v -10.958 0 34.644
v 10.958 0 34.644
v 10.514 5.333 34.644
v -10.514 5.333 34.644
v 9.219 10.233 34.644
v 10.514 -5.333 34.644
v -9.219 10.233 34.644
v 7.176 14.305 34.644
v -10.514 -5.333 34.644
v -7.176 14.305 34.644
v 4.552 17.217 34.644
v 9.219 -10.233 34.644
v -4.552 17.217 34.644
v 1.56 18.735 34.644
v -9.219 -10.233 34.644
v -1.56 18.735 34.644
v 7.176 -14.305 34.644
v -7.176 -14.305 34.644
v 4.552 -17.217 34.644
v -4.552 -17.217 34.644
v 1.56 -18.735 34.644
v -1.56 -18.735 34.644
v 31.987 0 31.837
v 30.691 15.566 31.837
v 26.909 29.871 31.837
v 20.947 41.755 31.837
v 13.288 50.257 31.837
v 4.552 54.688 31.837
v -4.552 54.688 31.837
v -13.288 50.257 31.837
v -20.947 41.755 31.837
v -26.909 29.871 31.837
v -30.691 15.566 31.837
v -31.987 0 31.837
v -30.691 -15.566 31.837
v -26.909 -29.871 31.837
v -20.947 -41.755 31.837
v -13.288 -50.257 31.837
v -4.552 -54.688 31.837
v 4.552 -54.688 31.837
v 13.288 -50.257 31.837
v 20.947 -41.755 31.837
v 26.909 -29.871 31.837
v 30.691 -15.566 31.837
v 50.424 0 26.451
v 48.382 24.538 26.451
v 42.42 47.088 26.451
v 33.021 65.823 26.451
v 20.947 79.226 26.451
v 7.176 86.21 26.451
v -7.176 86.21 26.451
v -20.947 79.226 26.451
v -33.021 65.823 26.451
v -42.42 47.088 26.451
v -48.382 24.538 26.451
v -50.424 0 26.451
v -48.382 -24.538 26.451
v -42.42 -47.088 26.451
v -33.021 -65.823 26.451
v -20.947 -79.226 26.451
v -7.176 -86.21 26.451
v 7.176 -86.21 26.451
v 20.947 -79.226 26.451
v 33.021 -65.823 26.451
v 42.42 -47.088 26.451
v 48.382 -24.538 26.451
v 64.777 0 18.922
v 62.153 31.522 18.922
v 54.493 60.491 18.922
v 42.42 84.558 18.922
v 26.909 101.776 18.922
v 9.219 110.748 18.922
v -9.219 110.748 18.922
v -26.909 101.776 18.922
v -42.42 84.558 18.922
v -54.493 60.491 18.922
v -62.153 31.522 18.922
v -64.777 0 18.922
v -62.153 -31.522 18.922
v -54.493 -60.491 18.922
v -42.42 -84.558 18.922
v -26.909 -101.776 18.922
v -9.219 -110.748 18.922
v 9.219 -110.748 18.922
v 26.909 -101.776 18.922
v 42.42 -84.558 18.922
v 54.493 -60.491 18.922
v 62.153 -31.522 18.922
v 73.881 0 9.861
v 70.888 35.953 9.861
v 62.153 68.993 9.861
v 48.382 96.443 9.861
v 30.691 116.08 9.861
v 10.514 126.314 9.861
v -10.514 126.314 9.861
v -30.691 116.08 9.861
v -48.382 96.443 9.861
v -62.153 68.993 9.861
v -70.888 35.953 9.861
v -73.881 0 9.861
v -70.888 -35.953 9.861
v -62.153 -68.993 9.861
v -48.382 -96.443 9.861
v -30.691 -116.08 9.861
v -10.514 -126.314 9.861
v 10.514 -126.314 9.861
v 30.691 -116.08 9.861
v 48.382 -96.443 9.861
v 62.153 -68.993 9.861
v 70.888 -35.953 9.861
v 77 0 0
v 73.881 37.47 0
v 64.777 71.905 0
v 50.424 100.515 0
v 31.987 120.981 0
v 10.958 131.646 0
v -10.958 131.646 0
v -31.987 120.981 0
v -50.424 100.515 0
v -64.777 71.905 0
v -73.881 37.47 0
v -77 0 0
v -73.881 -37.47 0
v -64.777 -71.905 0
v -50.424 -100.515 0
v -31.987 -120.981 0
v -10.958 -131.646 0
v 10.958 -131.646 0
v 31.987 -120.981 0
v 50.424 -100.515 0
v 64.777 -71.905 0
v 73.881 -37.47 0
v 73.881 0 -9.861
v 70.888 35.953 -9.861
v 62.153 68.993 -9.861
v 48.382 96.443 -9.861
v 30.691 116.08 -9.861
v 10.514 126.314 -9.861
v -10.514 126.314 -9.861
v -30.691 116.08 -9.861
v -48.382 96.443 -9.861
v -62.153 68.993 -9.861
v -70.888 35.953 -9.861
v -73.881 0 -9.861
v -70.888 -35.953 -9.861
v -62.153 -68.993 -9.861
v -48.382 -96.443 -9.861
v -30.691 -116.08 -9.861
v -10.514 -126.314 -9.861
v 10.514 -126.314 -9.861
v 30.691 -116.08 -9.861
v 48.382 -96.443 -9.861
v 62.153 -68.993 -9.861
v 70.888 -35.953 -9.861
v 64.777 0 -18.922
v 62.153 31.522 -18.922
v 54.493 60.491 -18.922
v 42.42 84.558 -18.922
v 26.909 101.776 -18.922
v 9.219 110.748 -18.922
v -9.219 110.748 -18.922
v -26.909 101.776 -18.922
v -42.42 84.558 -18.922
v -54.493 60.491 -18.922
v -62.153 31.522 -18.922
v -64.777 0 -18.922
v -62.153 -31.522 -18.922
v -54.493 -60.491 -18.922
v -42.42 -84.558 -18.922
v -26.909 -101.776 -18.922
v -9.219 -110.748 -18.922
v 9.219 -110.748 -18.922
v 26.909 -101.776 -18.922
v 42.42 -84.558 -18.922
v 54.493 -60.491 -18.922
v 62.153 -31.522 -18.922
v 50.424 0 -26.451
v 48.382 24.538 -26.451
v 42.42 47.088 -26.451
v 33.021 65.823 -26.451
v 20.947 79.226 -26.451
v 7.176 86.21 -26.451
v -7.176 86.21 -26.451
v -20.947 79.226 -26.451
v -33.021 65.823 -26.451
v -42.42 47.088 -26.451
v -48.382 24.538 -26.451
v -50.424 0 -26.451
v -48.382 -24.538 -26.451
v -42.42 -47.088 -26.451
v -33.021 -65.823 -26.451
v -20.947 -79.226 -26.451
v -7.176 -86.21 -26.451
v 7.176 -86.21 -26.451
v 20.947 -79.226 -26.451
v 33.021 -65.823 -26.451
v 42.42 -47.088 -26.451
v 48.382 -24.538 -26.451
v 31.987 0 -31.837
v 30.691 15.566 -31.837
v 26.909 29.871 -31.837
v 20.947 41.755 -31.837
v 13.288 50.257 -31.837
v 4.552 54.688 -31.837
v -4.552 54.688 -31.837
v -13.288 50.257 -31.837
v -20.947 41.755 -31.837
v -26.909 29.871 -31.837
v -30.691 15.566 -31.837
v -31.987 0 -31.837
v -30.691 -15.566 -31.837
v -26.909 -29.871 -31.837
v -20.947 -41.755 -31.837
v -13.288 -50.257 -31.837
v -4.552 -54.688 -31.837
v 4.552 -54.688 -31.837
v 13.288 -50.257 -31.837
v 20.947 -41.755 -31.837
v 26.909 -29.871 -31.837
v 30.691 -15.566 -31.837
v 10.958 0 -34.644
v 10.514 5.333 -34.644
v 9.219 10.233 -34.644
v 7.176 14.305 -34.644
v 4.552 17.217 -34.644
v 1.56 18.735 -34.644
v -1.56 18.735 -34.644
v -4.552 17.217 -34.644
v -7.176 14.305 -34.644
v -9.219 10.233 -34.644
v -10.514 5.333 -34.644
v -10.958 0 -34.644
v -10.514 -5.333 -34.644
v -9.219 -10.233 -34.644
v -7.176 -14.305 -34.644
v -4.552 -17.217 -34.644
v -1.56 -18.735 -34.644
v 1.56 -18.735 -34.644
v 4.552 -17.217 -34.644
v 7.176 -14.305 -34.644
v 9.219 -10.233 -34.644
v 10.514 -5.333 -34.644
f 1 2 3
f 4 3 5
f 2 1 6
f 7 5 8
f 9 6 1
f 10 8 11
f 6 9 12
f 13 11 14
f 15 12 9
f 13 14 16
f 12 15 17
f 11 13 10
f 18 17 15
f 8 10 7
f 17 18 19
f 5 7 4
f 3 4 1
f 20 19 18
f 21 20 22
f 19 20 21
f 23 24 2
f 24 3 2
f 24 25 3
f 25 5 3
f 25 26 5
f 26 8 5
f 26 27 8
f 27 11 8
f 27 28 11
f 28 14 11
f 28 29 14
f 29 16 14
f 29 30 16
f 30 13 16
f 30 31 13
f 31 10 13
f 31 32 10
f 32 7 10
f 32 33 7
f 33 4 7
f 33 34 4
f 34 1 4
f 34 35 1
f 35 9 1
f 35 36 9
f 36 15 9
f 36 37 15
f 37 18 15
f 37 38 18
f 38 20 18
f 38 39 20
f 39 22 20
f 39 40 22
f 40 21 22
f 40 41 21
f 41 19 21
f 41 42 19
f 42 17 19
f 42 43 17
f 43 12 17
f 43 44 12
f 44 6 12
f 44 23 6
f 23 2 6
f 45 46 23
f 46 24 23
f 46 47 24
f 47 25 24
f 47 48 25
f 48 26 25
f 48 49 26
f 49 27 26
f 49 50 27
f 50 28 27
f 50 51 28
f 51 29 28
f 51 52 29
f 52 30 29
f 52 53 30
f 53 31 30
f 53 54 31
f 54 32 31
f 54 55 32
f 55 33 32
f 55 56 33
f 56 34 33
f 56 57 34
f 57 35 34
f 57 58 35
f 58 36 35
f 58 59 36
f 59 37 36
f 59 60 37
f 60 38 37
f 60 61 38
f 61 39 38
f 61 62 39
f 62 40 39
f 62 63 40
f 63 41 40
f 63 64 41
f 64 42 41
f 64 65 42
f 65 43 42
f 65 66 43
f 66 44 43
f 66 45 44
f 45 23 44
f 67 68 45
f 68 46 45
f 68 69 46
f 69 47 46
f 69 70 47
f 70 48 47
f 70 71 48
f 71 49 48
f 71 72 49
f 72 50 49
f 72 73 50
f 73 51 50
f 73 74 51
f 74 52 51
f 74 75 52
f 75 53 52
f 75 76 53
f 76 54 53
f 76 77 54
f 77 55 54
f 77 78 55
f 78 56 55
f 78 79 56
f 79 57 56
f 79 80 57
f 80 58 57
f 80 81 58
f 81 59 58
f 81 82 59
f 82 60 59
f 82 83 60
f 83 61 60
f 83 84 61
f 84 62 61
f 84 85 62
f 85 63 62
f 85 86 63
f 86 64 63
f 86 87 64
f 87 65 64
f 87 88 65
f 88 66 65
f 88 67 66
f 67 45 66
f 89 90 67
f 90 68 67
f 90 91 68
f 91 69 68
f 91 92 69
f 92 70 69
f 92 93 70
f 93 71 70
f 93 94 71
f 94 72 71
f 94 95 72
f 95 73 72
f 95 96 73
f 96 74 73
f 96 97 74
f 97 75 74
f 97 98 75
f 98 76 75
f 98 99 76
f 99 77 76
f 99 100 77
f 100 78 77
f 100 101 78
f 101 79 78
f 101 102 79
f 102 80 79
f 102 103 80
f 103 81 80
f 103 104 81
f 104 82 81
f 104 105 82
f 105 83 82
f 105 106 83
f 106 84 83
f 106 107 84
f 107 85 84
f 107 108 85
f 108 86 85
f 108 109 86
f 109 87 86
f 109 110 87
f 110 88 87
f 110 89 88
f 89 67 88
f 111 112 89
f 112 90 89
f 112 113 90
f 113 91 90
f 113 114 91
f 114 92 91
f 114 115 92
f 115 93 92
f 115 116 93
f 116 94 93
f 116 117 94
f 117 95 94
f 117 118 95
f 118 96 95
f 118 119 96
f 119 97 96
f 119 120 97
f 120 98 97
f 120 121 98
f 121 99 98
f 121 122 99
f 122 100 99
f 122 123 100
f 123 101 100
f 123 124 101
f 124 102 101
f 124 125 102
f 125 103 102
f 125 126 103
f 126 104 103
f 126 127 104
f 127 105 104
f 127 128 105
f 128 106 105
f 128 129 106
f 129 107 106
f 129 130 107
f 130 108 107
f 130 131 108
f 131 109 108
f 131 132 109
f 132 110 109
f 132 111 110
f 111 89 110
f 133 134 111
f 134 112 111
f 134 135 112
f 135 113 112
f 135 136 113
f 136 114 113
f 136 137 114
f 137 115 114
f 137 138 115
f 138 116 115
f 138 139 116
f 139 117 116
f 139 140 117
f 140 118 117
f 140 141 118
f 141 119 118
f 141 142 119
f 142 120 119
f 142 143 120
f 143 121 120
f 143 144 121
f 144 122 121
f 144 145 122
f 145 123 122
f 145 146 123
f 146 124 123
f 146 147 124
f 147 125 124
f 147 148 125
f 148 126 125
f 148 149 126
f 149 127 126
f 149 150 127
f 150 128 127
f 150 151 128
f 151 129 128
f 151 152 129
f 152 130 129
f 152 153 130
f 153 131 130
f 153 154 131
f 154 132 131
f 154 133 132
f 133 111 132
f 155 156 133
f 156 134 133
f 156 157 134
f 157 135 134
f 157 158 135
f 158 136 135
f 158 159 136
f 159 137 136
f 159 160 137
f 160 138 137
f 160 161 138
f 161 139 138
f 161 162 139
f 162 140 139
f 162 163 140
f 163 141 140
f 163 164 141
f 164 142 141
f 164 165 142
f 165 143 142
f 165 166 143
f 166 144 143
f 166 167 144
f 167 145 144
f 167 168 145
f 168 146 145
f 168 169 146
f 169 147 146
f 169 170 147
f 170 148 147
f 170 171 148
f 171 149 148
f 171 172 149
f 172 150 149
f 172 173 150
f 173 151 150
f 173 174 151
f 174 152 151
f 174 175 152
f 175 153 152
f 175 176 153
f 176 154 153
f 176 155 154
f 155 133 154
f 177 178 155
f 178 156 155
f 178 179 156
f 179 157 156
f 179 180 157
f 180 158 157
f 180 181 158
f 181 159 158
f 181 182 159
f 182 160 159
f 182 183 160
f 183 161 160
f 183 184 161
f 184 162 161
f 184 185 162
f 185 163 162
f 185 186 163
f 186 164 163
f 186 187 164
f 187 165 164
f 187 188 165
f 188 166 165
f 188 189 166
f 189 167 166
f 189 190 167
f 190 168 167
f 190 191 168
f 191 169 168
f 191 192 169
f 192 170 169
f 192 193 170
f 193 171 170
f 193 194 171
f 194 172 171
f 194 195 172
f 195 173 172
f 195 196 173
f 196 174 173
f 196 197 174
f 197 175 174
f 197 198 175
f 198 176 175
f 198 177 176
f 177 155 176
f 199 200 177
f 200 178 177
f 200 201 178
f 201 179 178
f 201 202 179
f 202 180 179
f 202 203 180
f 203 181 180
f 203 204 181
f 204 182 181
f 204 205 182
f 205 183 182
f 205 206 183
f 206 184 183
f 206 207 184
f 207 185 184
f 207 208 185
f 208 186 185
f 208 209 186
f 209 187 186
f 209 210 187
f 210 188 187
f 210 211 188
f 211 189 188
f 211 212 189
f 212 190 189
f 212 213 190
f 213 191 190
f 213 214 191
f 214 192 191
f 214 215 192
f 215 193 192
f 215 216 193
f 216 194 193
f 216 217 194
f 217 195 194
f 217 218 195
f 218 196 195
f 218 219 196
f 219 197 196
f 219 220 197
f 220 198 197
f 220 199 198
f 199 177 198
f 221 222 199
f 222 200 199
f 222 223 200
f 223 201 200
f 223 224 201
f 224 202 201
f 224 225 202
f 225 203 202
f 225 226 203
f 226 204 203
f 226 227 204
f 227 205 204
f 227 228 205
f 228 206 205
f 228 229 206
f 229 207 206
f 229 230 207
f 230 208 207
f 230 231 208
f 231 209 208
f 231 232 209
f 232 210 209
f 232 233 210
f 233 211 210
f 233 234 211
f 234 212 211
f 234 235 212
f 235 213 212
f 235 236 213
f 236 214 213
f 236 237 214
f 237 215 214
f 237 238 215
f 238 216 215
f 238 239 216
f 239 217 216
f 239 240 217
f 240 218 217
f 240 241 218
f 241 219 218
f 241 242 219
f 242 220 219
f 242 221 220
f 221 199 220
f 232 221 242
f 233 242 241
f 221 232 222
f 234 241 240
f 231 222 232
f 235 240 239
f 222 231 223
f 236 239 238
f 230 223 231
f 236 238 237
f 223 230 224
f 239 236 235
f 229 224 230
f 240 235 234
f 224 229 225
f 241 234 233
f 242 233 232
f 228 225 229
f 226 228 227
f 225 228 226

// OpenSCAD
// Generated by SolidPython 1.0.1 on 2020-07-29 00:46:50


scale(v = [11, 19, 5]) {
	sphere(r = 7);
}
/***********************************************
*********      SolidPython code:      **********
************************************************
 
# import packages: SolidPython
from solid import *
from solid.utils import *
from itertools import chain, combinations, permutations


class Resize:

    def __init__(self, scad_file):
        self.scad_file = scad_file
        #self.scad_file = import_scad(scad_file)
        # cone/cylinder param:
        self.r1 = 0
        self.r2 = 0
        self.h = 0
        # rectangular prism param:
        self.w = 0
        self.l = 0
        # ellipse param:
        self.r = 0

    # import OpenScad code (file name corresponds to shape)


    # classify shape + parameters
    def assign(self, param1, param2, param3):
        if self.scad_file == 'cone.scad':
            self.r1 = param1
            self.r2 = param2
            self.h = param3
        elif self.scad_file == 'cylinder.scad':
            self.r1 = param1
            self.r2 = param2
            self.h = param3
        elif self.scad_file == 'rectangularPrism.scad':
            self.h = param1
            self.l = param2
            self.w = param3
        else:
            self.r = param1
            self.h = param2

    # resize parameters
    def iterate(self):
        x = range(3, 20, 2)
        i = 1
        if self.scad_file == 'cone.scad':
            tempList = list(permutations(x, 2))
            for temp in tempList:
                param1 = temp[0]
                param2 = temp[1]
                filepath = 'produced_scad_files/' + 'cone' + str(param1) + '_' + str(param2) + '_' + '.scad'
                scad_render_to_file(cylinder(h=param1, r1=param2, r2=0), filepath)

        elif self.scad_file == 'cylinder.scad':
            tempList = list(permutations(x, 3))
            for temp in tempList:
                param1 = temp[0]
                param2 = temp[1]
                filepath = 'produced_scad_files/' + 'cylinder' + str(param1) + '_' + str(param2) + '_' + '.scad'
                scad_render_to_file(cylinder(h=param1, r1=param2, r2=param2), filepath)

        elif self.scad_file == 'rectangularPrism.scad':
            tempList = list(permutations(x, 3))
            for temp in tempList:
                param1 = temp[0]
                param2 = temp[1]
                param3 = temp[2]
                filepath = 'produced_scad_files/' + 'rectangularPrism' + str(param1) + '_' + str(param2) + '_' + str(
                    param3) + '.scad'
                scad_render_to_file(cube(size=(param1, param2, param3)), filepath)

        elif self.scad_file == 'ellipse.scad':
            tempList = list(permutations(x, 4))
            for temp in tempList:
                param1 = temp[0]
                param2 = temp[1]
                param3 = temp[2]
                param4 = temp[3]
                filepath = 'produced_scad_files/' + 'ellipse' + str(param1) + '_' + str(param2) + '_' + str(param3) + '_' + str(param4) + '.scad'
                scad_render_to_file(scale([param1, param2, param3])(sphere(r=param4)), filepath)

    def render_to_scadfile(self):
        scad_render_to_file(scad, 'example.scad') 
 
************************************************/
